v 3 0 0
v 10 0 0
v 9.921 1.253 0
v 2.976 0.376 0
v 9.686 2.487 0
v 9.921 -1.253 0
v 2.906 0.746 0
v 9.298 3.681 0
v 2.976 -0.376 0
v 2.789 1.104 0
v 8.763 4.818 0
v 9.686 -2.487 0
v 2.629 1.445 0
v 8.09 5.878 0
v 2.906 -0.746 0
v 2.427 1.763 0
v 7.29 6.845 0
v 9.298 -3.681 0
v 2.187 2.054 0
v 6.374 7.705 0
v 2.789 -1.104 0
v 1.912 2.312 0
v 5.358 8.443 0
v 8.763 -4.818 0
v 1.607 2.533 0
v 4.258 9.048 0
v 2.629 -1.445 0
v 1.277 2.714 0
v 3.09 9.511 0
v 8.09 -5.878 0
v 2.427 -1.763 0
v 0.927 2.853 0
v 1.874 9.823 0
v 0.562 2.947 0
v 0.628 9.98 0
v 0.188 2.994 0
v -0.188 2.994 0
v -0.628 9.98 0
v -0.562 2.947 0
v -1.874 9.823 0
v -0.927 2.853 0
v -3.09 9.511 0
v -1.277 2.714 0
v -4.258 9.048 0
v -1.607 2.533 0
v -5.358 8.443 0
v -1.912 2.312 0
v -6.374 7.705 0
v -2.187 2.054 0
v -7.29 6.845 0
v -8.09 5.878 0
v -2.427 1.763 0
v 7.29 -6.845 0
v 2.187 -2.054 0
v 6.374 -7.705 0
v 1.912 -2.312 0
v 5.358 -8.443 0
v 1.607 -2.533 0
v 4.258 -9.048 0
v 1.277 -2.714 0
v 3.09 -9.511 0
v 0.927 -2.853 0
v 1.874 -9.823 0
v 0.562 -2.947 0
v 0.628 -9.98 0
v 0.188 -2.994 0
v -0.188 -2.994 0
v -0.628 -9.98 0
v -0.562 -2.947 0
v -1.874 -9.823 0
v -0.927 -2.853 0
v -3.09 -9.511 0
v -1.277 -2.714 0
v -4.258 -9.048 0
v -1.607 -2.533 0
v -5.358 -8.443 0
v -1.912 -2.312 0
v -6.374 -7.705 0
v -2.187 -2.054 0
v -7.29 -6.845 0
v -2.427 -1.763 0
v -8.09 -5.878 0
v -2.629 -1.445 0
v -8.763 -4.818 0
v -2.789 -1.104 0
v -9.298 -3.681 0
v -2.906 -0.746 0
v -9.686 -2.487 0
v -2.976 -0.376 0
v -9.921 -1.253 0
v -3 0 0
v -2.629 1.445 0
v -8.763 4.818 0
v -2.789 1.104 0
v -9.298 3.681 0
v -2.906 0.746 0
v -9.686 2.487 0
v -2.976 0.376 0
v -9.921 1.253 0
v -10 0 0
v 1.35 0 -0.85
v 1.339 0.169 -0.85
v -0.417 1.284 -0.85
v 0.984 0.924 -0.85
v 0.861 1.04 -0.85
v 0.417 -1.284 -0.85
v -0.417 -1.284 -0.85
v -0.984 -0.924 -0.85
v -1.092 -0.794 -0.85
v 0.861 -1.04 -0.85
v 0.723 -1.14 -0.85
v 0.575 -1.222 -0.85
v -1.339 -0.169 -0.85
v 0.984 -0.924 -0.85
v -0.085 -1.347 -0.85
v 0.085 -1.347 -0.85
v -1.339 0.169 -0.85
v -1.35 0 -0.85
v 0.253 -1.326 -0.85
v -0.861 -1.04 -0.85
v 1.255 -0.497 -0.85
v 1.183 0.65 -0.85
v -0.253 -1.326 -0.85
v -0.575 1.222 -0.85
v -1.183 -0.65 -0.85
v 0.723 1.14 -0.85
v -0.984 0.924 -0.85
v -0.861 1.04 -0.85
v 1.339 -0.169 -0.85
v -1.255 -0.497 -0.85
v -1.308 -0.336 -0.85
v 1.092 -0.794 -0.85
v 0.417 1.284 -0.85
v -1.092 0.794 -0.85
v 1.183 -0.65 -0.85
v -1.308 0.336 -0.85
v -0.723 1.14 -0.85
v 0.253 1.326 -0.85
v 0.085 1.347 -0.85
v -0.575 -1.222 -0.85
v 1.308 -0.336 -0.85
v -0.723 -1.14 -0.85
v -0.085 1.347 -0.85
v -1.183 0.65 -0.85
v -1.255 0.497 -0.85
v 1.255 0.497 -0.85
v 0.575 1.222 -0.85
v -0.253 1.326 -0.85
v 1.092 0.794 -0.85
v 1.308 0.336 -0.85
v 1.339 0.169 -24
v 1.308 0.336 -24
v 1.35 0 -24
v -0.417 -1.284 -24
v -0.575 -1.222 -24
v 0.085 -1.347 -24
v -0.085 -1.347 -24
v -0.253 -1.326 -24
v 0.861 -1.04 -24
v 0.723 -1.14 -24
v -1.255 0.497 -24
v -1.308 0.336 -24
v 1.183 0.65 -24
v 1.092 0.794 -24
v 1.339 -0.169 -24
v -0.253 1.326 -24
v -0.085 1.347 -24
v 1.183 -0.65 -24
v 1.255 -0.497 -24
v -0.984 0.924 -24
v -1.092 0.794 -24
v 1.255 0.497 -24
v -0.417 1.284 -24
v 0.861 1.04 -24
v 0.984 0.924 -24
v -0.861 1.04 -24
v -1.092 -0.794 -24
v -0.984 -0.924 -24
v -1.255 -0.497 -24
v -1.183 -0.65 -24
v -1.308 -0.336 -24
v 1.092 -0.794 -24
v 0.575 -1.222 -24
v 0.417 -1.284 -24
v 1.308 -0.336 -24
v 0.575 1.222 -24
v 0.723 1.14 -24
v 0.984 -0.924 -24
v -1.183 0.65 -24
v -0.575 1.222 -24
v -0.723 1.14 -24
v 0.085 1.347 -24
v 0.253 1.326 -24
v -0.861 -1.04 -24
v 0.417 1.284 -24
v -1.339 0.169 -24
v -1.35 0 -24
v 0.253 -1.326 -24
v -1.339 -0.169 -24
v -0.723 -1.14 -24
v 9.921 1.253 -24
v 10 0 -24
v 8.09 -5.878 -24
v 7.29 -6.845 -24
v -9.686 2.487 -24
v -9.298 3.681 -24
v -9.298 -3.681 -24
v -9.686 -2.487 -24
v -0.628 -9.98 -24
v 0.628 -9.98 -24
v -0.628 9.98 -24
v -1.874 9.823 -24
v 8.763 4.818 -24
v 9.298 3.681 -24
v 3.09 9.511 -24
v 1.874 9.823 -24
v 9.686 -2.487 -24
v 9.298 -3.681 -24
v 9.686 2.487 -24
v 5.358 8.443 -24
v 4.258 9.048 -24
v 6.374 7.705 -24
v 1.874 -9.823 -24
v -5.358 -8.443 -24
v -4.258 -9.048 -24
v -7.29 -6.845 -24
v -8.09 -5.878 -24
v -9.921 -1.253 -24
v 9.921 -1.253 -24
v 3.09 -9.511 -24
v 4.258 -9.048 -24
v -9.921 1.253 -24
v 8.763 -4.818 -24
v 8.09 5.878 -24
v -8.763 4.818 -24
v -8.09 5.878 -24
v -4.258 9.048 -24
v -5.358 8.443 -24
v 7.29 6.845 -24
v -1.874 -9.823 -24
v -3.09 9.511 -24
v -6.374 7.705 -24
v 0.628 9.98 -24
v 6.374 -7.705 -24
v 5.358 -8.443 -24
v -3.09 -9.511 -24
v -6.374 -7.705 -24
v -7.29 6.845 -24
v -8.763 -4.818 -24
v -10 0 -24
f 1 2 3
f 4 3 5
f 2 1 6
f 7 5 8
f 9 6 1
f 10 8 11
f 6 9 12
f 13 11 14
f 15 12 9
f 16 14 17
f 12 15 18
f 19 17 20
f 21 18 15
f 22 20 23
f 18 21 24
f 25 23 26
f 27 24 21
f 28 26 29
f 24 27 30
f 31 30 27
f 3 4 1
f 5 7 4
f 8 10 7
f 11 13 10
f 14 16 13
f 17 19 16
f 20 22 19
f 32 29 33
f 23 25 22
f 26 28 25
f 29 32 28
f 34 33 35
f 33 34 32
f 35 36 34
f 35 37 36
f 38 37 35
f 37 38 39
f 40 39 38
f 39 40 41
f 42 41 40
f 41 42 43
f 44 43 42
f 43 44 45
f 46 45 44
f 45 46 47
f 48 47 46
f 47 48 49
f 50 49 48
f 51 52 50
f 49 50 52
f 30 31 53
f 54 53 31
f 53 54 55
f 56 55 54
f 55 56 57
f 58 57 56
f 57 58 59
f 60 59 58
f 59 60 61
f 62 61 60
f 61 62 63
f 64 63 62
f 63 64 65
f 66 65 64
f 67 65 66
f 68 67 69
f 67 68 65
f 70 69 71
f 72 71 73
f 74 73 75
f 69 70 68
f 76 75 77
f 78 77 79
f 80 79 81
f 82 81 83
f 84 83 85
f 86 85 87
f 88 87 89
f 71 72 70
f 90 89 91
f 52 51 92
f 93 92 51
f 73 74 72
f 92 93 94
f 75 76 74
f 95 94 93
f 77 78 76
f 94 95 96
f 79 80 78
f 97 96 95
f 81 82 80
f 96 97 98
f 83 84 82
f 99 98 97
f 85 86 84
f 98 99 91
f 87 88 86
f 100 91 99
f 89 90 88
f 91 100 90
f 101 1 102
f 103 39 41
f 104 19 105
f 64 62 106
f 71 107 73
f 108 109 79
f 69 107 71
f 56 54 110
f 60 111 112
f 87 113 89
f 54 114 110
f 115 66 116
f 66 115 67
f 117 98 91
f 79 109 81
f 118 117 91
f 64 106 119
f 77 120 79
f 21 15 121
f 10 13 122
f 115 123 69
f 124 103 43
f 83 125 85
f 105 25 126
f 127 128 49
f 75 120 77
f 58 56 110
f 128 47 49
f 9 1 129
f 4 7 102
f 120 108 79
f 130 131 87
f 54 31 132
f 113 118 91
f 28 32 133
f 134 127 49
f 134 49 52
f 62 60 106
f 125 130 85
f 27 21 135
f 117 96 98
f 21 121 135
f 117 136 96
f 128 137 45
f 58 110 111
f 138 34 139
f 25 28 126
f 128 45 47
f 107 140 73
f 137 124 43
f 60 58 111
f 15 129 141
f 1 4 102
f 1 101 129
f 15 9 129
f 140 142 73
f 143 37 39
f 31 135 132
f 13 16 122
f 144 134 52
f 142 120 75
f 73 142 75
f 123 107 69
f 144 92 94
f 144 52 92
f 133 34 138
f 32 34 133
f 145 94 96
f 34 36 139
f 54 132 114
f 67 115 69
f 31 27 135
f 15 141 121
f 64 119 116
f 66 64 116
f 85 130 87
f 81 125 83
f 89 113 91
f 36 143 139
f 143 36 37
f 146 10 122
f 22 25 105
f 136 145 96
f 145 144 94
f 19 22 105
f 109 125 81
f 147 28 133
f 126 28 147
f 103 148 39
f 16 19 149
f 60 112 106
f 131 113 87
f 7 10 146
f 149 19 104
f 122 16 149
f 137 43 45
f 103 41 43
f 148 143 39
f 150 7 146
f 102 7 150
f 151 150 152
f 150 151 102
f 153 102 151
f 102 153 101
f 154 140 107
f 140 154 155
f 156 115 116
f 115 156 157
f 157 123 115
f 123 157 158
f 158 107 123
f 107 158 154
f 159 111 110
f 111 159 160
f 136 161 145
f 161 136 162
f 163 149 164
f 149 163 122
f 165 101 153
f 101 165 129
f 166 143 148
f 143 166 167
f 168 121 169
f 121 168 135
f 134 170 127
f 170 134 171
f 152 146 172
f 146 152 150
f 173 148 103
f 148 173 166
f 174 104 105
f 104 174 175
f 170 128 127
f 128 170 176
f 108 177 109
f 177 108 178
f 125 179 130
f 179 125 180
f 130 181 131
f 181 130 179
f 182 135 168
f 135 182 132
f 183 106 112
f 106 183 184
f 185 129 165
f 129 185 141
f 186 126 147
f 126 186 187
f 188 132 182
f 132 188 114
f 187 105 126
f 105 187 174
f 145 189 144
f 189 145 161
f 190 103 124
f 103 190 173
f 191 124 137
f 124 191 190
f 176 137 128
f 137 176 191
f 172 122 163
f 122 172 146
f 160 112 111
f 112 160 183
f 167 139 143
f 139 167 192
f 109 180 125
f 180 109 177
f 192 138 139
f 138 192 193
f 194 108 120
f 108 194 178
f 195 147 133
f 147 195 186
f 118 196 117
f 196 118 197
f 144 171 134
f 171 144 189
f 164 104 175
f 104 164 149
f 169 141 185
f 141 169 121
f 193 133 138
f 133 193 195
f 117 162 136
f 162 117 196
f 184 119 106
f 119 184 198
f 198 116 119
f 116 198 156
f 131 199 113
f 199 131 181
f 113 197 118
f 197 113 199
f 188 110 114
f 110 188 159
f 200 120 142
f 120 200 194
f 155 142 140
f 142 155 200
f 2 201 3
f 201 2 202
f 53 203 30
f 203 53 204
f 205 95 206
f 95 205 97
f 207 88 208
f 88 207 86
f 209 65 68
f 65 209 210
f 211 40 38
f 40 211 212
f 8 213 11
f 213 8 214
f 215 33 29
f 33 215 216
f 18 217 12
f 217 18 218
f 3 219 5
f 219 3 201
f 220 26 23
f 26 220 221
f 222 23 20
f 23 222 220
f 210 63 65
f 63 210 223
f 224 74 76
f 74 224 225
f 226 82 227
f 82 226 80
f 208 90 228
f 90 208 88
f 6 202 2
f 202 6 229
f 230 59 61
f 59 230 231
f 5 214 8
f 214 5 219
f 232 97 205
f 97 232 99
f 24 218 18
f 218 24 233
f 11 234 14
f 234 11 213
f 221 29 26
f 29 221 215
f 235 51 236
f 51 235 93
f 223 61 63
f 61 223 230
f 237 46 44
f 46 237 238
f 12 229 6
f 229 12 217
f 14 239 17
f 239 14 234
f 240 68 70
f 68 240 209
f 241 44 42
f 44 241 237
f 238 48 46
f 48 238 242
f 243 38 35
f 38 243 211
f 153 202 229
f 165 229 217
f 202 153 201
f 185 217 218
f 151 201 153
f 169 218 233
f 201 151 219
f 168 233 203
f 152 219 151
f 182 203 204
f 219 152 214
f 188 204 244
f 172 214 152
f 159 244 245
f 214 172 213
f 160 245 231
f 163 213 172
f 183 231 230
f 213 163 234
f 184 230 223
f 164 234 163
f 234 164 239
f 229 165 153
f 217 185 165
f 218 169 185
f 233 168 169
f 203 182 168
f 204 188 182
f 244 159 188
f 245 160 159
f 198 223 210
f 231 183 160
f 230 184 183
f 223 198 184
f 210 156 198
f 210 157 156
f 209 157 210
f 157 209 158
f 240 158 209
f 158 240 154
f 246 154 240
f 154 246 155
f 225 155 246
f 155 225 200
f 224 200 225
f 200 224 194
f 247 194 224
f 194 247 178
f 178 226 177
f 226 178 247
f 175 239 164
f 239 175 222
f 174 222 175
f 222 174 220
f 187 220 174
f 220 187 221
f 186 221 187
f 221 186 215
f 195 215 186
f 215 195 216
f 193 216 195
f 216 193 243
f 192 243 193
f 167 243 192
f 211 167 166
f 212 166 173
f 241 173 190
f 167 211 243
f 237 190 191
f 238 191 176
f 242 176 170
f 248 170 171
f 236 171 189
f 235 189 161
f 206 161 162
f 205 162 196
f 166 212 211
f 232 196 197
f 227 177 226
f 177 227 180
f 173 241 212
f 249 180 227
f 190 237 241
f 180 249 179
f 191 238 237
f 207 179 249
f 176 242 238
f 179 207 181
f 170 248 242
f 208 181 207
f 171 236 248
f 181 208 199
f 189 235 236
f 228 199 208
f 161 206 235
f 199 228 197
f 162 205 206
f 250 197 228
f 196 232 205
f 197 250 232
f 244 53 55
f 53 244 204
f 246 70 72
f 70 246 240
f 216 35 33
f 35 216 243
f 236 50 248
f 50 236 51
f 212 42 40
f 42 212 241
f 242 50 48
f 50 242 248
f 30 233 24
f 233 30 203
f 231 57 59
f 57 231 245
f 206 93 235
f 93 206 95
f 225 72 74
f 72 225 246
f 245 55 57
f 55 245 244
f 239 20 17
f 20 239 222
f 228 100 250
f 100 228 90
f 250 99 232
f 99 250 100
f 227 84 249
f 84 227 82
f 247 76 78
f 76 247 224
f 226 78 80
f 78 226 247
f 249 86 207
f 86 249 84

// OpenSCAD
$fn = 50;

difference() {
	union() {
		translate(v = [0, 0, -24.0]) {
			cylinder(h = 24, r = 10.0);
		}
	}
	union() {
		translate(v = [0, 0, 0]) {
			rotate(a = [0, 0, 0]) {
				difference() {
					union() {
						translate(v = [0, 0, -27.0]) {
							cylinder(h = 27, r = 1.0);
						}
						translate(v = [0, 0, -0.85]) {
							cylinder(h = 0.85, r1 = 1.35, r2 = 3.0);
						}
						translate(v = [0, 0, -27.0]) {
							cylinder(h = 27, r = 1.35);
						}
						translate(v = [0, 0, -27.0]) {
							cylinder(h = 27, r = 1.0);
						}
					}
					union();
				}
			}
		}
	}
}
